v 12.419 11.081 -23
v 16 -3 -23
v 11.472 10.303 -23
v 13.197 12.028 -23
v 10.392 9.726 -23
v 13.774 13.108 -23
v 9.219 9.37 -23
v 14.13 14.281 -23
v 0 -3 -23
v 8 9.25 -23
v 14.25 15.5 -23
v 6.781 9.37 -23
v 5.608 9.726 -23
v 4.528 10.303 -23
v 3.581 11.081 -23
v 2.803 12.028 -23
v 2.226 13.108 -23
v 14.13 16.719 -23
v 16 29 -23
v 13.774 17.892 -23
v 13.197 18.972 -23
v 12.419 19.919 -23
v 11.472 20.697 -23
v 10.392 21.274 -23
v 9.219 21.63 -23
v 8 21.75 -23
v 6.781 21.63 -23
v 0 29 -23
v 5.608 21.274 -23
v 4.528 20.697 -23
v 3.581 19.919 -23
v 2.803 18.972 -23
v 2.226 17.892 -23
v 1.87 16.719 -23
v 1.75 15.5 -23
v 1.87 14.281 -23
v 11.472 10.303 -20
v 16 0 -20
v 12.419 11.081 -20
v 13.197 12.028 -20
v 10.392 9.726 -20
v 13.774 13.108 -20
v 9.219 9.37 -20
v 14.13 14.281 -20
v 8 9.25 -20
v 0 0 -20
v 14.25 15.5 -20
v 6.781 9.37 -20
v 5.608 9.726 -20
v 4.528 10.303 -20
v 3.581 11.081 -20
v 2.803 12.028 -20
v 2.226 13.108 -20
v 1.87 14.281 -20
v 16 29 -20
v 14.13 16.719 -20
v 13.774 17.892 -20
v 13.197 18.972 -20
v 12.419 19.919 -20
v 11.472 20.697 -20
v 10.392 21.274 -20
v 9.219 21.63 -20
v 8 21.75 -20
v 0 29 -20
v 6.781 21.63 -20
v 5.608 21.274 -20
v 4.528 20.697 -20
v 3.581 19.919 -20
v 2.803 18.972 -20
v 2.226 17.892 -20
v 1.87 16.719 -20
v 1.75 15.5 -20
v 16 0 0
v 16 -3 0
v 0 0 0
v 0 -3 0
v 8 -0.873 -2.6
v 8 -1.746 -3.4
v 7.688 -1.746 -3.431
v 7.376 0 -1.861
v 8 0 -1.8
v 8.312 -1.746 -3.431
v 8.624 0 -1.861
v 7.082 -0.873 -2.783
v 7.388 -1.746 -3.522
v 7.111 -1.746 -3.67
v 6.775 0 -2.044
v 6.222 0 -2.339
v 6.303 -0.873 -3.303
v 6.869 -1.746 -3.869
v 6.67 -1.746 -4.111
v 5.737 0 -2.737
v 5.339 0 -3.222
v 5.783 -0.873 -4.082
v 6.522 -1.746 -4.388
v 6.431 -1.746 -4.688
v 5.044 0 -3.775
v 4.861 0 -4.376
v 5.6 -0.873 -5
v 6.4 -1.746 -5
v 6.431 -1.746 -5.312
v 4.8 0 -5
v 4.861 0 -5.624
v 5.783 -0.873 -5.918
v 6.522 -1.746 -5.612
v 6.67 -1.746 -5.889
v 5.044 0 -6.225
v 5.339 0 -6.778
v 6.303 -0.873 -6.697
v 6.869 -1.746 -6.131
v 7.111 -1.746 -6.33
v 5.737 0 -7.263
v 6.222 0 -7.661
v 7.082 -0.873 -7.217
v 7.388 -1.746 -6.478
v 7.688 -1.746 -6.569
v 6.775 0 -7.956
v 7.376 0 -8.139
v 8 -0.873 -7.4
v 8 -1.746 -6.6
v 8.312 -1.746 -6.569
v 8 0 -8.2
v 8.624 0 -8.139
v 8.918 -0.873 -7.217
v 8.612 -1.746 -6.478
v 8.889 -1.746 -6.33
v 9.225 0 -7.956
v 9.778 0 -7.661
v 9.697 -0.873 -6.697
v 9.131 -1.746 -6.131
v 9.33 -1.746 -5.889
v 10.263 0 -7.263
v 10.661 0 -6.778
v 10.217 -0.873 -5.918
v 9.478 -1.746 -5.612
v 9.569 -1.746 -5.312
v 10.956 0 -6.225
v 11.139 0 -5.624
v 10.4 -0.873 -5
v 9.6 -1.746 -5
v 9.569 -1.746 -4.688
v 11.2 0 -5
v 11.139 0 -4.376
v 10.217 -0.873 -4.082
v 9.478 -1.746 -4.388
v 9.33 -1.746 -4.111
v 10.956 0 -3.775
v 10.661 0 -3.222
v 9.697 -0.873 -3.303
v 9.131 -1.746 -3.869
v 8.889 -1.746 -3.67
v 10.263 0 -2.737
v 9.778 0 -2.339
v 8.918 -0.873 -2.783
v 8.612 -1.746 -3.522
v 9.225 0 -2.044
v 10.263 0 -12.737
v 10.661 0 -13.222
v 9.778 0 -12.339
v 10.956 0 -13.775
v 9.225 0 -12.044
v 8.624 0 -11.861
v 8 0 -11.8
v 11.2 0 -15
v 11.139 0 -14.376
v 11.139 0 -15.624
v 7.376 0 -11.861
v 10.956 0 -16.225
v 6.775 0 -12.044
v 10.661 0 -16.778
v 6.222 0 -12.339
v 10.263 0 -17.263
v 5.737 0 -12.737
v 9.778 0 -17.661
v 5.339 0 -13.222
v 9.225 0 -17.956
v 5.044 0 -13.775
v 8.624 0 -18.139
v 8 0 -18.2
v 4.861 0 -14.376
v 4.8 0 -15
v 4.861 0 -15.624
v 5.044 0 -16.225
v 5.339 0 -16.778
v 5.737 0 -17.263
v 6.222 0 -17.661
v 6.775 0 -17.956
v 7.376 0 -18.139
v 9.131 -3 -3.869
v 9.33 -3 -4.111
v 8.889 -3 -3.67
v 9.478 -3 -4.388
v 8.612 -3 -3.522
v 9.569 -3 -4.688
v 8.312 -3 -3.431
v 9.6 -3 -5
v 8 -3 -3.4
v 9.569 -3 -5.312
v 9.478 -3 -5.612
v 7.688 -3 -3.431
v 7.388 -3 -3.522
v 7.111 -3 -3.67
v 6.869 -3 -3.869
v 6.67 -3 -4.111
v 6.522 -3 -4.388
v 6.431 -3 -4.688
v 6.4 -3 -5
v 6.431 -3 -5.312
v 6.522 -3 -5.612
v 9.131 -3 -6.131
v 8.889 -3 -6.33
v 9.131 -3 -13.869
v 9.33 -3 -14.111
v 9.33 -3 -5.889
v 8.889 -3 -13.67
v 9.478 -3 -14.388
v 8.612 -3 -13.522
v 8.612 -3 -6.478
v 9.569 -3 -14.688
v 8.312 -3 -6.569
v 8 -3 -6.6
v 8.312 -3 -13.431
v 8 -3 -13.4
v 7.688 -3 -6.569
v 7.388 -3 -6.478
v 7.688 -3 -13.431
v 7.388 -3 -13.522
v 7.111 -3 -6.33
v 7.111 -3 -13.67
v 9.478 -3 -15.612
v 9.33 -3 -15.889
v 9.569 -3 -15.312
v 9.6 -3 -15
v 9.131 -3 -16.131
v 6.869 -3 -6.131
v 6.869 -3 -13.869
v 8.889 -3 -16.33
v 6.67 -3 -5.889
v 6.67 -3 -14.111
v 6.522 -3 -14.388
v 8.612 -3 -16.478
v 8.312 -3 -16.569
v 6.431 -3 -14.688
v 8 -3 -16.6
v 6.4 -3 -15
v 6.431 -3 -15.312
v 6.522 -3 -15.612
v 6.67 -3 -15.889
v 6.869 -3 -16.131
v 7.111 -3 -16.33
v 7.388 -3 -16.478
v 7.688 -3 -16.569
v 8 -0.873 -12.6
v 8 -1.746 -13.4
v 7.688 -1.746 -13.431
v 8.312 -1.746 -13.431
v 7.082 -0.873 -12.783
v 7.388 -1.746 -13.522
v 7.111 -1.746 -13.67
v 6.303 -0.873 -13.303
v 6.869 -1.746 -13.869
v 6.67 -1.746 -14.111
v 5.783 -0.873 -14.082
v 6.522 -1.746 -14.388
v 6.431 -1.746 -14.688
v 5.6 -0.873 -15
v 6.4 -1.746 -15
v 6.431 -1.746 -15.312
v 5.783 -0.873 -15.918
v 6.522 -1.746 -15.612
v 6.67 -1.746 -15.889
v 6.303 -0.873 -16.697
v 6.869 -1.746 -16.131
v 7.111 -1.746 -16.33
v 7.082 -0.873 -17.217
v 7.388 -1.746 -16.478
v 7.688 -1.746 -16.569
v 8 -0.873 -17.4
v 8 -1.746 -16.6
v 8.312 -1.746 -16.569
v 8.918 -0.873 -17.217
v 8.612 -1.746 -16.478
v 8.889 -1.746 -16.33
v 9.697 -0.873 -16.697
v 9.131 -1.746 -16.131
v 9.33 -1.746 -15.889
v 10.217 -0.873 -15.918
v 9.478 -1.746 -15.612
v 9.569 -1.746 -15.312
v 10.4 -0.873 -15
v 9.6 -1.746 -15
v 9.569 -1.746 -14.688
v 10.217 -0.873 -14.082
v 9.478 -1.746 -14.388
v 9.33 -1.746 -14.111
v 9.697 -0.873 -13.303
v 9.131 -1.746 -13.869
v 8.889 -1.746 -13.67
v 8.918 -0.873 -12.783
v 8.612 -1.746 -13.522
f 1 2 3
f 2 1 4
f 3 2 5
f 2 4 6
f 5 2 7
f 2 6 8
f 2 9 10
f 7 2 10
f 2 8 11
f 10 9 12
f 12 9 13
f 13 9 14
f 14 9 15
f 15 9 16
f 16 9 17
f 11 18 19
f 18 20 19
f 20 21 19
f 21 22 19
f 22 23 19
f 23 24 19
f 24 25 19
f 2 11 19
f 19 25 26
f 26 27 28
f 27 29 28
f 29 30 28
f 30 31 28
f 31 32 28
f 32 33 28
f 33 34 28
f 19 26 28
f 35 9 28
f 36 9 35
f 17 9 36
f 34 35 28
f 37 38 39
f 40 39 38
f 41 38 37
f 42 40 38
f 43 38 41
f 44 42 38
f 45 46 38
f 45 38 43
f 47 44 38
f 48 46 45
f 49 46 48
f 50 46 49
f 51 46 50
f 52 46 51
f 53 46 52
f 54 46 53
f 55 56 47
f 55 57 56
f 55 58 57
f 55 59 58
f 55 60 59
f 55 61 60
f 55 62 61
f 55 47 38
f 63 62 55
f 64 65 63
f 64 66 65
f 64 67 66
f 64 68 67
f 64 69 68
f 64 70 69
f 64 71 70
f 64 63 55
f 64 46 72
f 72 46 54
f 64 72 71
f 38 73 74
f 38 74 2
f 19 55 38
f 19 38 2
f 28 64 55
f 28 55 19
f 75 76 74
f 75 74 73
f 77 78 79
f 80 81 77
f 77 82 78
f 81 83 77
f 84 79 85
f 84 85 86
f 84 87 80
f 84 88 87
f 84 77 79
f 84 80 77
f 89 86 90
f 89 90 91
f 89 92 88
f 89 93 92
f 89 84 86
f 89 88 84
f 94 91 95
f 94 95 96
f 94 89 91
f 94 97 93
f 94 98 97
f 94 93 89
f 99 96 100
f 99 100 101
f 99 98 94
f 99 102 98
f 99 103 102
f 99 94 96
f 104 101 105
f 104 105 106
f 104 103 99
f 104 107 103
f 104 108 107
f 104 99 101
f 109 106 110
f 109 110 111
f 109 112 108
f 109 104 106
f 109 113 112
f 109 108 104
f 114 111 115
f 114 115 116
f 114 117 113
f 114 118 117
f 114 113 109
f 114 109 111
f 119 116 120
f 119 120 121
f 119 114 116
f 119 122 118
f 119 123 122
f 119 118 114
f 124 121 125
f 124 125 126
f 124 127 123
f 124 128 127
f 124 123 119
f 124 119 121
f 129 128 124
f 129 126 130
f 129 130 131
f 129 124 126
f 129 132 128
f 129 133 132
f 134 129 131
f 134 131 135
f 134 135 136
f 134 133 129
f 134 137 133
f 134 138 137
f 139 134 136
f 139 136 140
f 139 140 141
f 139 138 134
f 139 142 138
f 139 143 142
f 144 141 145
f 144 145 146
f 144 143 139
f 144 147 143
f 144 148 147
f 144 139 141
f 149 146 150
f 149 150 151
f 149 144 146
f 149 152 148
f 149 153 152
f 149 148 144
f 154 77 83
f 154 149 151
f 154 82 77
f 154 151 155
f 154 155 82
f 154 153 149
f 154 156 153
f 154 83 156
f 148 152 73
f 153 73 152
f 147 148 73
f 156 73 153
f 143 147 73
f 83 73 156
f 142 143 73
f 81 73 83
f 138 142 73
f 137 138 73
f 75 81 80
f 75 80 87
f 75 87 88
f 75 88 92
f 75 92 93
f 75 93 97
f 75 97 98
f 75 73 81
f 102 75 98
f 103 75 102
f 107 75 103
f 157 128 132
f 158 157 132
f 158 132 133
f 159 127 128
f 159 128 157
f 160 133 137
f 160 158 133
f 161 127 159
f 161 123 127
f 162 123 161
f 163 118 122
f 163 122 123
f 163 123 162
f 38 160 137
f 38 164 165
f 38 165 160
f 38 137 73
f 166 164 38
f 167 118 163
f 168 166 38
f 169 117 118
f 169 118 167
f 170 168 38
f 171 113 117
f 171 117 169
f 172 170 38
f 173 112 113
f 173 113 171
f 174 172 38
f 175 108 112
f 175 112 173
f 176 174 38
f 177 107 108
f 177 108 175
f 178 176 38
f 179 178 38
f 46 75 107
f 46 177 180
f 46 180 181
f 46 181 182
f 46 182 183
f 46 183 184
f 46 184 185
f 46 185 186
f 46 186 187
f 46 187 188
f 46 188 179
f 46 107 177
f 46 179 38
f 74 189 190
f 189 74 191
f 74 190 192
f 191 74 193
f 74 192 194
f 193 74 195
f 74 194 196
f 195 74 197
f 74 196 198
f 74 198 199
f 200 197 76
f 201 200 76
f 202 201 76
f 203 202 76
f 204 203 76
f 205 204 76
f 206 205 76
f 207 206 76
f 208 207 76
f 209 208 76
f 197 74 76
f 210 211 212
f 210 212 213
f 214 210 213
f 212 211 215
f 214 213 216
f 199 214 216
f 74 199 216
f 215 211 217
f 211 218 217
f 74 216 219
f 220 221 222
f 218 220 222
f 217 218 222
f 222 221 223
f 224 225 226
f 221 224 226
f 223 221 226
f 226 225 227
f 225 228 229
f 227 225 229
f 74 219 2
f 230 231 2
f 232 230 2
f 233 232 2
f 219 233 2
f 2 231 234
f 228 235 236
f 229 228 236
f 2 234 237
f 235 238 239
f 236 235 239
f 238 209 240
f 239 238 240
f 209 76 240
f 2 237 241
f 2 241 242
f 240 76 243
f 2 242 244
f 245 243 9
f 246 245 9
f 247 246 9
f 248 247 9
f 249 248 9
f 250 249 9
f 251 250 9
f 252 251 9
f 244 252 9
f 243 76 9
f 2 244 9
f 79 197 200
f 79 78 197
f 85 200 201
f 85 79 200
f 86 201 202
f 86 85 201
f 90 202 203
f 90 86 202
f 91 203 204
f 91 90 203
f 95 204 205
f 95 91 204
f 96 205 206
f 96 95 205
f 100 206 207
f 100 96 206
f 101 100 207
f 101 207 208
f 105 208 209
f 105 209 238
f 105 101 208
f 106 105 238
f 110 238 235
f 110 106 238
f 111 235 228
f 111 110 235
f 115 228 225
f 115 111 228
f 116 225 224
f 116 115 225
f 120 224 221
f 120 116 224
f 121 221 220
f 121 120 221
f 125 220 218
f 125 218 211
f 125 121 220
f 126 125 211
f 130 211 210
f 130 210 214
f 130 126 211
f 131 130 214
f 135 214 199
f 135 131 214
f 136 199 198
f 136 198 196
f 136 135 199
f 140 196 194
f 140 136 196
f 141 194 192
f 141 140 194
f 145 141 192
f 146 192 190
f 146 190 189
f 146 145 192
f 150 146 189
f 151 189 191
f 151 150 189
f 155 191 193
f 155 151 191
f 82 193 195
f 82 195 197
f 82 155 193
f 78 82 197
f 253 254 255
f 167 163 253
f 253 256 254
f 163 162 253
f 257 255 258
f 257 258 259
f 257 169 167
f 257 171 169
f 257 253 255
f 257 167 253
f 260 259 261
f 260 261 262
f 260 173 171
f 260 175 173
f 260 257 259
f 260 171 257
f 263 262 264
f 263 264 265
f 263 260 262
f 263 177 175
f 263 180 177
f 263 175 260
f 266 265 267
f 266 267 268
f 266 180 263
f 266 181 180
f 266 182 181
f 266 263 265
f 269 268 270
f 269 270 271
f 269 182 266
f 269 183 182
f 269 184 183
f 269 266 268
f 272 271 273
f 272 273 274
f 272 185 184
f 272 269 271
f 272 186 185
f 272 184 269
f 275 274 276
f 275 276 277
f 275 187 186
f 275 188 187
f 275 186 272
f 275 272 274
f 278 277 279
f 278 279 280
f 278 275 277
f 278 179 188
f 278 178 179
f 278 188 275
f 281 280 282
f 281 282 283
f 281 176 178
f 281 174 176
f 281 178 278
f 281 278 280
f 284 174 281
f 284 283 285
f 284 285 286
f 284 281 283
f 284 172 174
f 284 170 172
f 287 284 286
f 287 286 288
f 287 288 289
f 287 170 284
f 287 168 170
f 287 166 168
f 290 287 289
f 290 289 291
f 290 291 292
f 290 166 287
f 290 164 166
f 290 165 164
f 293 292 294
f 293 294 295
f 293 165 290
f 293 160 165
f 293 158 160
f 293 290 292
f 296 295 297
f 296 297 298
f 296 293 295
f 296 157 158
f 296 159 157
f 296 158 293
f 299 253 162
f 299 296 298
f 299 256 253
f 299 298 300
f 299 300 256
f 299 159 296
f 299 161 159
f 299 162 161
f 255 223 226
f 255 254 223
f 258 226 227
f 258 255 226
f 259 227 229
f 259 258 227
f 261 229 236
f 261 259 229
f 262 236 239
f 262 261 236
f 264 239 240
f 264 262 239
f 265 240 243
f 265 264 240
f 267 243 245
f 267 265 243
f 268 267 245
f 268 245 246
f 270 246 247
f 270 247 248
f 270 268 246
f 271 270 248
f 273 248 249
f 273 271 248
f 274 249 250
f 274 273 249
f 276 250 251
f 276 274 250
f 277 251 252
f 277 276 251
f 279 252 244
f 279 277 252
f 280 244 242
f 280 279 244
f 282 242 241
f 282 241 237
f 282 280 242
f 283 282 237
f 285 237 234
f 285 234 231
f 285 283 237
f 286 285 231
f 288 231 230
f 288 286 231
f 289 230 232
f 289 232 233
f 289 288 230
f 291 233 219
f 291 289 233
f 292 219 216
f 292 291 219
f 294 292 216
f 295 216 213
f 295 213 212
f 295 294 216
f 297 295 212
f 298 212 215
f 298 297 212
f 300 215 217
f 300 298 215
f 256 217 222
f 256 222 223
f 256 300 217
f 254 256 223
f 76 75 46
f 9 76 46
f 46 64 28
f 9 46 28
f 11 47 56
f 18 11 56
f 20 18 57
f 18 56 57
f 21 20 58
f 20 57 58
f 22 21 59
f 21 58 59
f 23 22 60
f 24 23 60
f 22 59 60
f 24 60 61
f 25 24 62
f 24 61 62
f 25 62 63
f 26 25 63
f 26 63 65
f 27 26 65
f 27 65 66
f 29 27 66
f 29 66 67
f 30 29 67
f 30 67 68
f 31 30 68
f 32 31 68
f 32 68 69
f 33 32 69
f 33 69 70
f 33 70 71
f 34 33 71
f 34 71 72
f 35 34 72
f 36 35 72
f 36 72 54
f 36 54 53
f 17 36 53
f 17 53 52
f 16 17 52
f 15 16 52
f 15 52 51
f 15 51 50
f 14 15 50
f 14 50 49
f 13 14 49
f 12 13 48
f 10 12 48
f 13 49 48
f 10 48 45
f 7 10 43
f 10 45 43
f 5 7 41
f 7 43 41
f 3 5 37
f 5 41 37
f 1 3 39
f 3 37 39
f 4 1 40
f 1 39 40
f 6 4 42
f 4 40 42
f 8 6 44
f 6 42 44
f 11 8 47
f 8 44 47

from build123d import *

# Parameters (mm, degrees)
SKETCH1_W           = 23
SKETCH1_H           = 3
SKETCH1_W_2         = 3
SKETCH1_H_2         = 29
BOSS_EXTRUDE1_DEPTH = 16
HOLE1_AT_2_COUNT    = 2
HOLE1_AT_2_PITCH    = 10
SKETCH5_R           = 6.25
CUT_EXTRUDE1_DEPTH  = 39.691084244


with BuildPart() as part:
    # Sketch1 → Boss-Extrude1 (new body)
    with BuildSketch(Plane(origin=(0, 0, 0), x_dir=(0, 0, -1), z_dir=(1, 0, 0))):
        with Locations((11.5, -1.5)):
            Rectangle(SKETCH1_W, SKETCH1_H)
        with Locations((21.5, 14.5)):
            Rectangle(SKETCH1_W_2, SKETCH1_H_2)
    extrude(amount=BOSS_EXTRUDE1_DEPTH)

    # Sketch4 → Hole1 (revolve, cut)
    with BuildSketch(Plane(origin=(8, 0, -5), x_dir=(0, 0, 1), z_dir=(1, 0, 0))):
        Polygon((0, 0), (0, 3), (1.6, 3), (1.6, 1.746093602), (3.2, 0), align=None)
    hole1 = revolve(axis=Axis((8, 6.445314094, -5), (0, -1, 0)), mode=Mode.SUBTRACT)

    # Hole1 at 2: Hole1 ×2
    with Locations(*[(0, 0, -i * HOLE1_AT_2_PITCH) for i in range(1, HOLE1_AT_2_COUNT)]):
        add(hole1, mode=Mode.SUBTRACT)

    # Sketch5 → Cut-Extrude1 (cut, through all)
    with BuildSketch(Plane.XY.offset(-20)):
        with Locations((8, 15.5)):
            Circle(SKETCH5_R)
    extrude(amount=-CUT_EXTRUDE1_DEPTH, mode=Mode.SUBTRACT)


solid = part.part
